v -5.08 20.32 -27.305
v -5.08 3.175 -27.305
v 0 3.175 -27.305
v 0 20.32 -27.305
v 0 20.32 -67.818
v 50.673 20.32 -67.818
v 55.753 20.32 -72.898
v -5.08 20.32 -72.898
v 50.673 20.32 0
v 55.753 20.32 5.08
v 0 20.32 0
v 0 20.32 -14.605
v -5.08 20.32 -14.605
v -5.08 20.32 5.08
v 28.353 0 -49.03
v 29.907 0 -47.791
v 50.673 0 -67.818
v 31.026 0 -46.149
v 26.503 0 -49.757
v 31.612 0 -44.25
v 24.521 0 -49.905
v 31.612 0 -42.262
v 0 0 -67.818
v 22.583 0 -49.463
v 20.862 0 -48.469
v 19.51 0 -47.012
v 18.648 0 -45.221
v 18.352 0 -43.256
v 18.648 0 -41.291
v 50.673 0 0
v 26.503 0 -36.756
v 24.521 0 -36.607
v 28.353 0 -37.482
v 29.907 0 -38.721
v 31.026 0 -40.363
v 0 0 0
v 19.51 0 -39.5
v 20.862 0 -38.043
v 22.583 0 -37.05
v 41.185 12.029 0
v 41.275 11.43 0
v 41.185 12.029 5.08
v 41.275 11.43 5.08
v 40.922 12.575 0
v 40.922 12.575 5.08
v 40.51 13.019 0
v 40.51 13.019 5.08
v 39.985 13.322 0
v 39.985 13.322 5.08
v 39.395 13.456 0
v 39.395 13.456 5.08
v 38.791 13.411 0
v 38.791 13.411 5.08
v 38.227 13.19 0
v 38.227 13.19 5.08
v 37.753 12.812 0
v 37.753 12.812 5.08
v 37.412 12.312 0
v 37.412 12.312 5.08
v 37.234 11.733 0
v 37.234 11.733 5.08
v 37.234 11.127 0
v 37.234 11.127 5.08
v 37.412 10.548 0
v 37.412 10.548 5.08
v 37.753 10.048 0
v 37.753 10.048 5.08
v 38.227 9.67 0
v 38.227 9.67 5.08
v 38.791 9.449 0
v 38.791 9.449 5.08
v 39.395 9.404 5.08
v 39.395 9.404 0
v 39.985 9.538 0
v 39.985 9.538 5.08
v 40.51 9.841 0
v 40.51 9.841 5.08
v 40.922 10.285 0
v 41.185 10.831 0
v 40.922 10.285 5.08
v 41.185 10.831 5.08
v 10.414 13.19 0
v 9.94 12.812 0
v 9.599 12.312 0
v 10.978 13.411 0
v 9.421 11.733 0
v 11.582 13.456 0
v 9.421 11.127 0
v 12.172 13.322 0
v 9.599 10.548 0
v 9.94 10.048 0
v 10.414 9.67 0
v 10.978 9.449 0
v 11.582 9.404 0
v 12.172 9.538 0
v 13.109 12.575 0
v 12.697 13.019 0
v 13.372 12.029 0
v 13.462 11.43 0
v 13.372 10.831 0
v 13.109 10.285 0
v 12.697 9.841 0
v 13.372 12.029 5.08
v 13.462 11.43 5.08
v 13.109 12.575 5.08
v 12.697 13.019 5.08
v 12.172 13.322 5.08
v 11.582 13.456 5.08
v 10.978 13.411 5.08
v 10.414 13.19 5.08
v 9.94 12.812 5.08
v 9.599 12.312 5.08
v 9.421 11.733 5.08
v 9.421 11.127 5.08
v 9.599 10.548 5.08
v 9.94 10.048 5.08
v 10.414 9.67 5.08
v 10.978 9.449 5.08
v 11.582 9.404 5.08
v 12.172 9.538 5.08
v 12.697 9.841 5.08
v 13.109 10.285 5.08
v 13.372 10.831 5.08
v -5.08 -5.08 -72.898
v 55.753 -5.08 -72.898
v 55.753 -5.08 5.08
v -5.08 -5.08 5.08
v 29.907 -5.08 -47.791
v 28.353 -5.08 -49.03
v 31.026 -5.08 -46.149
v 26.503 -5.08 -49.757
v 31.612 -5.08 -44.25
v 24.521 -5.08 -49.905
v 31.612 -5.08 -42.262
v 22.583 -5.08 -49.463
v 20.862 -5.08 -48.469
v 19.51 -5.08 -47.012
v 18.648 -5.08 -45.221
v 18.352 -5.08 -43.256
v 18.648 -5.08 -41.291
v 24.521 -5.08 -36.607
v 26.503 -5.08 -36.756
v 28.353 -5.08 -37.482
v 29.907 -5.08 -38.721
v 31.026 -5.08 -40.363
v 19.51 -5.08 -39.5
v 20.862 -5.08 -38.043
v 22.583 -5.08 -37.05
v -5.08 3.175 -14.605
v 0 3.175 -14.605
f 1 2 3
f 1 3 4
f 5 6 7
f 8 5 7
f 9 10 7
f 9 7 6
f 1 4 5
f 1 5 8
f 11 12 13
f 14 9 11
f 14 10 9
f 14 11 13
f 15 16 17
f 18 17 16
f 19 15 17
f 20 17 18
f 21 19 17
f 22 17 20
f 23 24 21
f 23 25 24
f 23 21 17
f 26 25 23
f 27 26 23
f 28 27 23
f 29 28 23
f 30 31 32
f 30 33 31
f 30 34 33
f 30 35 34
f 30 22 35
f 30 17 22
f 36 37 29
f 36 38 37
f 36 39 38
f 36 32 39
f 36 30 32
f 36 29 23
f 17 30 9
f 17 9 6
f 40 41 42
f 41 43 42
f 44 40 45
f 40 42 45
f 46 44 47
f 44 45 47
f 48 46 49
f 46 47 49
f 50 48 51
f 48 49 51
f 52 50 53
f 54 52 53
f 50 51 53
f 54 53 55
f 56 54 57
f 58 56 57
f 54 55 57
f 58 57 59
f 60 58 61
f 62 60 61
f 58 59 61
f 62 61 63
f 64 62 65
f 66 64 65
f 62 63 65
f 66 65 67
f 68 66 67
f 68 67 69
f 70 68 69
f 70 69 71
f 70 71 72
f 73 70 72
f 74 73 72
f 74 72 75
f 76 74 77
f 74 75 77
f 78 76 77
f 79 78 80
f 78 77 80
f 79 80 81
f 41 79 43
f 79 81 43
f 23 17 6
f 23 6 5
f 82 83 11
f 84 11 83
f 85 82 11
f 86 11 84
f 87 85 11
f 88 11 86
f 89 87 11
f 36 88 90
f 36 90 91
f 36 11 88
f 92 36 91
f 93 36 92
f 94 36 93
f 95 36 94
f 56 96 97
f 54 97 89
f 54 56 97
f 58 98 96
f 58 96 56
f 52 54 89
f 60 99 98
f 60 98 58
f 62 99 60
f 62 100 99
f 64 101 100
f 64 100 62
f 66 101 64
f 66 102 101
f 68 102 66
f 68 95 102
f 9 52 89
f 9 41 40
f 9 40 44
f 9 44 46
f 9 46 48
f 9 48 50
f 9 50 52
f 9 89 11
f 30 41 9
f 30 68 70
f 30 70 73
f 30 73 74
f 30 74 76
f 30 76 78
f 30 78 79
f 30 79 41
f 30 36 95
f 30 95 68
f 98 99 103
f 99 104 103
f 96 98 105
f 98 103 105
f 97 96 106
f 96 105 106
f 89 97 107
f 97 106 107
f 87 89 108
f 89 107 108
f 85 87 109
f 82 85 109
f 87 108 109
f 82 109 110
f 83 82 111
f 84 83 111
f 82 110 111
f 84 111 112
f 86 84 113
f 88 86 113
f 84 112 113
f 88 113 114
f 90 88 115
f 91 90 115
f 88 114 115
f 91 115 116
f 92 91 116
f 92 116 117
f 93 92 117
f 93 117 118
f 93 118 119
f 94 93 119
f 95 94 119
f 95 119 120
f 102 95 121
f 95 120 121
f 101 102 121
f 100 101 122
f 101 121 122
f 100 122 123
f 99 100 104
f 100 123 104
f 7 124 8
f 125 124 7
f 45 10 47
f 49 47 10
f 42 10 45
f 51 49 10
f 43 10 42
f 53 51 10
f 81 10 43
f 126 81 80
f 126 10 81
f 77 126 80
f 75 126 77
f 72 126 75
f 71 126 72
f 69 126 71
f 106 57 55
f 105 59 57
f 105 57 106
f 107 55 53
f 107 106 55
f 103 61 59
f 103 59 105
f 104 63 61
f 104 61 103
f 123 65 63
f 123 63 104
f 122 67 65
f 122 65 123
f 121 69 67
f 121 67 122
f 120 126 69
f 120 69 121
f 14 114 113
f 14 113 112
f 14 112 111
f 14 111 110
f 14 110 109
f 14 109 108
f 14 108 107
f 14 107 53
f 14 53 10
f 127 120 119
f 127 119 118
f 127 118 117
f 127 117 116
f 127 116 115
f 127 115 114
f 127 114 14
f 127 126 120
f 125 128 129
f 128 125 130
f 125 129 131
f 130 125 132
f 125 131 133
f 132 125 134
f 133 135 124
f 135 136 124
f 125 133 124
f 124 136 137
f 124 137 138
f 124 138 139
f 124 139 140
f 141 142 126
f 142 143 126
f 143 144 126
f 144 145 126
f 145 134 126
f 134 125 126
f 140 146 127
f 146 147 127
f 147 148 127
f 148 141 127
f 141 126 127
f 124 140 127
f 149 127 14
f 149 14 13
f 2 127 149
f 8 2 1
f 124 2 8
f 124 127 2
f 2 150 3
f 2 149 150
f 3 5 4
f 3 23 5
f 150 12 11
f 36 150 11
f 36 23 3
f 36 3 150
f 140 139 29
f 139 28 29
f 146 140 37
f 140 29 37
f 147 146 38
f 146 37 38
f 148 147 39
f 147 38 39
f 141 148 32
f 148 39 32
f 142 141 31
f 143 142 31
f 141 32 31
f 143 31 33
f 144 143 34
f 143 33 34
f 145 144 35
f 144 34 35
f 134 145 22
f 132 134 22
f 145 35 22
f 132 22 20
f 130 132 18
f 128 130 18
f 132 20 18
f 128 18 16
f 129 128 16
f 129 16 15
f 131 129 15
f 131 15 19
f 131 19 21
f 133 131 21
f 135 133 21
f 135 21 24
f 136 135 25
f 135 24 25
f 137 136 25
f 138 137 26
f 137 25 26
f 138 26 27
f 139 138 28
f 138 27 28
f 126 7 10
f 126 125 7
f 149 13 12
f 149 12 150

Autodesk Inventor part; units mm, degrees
ref_plane "YZ Plane" through (0, 0, 0) normal (1, 0, 0) x (0, 1, 0)
ref_plane "XZ Plane" through (0, 0, 0) normal (0, 1, 0) x (-1, 0, 0)
ref_plane "XY Plane" through (0, 0, 0) normal (0, 0, 1) x (1, 0, 0)
sketch "Sketch1" plane through (0, 0, 0) normal (0, 1, 0) x (-1, 0, 0)
  line L0 (0, 0) -> (-50.673, 0)
  line L1 (-50.673, 0) -> (-50.673, -67.818)
  line L2 (-50.673, -67.818) -> (0, -67.818)
  line L3 (0, -67.818) -> (0, 0)
  line L4 (5.08, -72.898) -> (-55.753, -72.898)
  line L5 (-55.753, -72.898) -> (-55.753, 5.08)
  line L6 (-55.753, 5.08) -> (5.08, 5.08)
  line L7 (5.08, 5.08) -> (5.08, -72.898)
  circle A0 centre (-25.019, -43.2562) radius 6.6675
  circle A1 centre (34.7838, -26.9997) radius 2.286
  dimension "d0" = 50.673
  dimension "d1" = 67.818
  dimension "d2" = 5.08
  dimension "d11" = 13.335
  dimension "d14" = 4.572
extrude "Extrusion1" add sketch "Sketch1" along normal blind 20.32 and the other way blind 5.08 contours L4 L5 L6 L7
extrude "Extrusion2" add sketch "Sketch1" against normal blind 5.08 contours L3 L2 L1 L0 | A0
extrude "Extrusion3" cut sketch "Sketch1" against normal blind 127 contours A0
sketch "Sketch2" plane through (-5.08, -5.08, 5.08) normal (-1, 0, 0) x (0, 0, 1)
  line L0 (0, 25.4) -> (-19.685, 25.4)
  line L1 (-77.978, 25.4) -> (0, 25.4) projected
  line L2 (-19.685, 25.4) -> (-19.685, 8.255)
  line L3 (-5.08, 5.08) -> (-72.898, 5.08) projected
  line L4 (-19.685, 8.255) -> (-32.385, 8.255)
  line L5 (-32.385, 8.255) -> (-32.385, 25.4)
  line L6 (-19.685, 25.4) -> (-32.385, 25.4)
  dimension "d15" = 19.685
  dimension "d16" = 17.145
  dimension "d17" = 12.7
extrude "Extrusion4" cut sketch "Sketch2" against normal blind 25.4
sketch "Sketch5" plane through (-5.08, 20.32, 5.08) normal (0, 0, 1) x (1, 0, 0)
  line L0 (16.51, 0) -> (16.51, -8.89)
  line L1 (0, 0) -> (0, -25.4) projected
  line L2 (60.833, 0) -> (44.323, 0)
  line L3 (0, 0) -> (60.833, 0) projected
  line L4 (44.323, 0) -> (44.323, -8.89)
  circle A0 centre (44.323, -8.89) radius 2.032
  circle A1 centre (16.51, -8.89) radius 2.032
  point P0 (5.08, -20.32)
  point P1 (16.51, -0.0329)
  dimension "d21" = 8.89
  dimension "d22" = 16.51
  dimension "d23" = 16.51
  dimension "d24" = 8.89
  dimension "d25" = 4.064
  dimension "d26" = 4.064
extrude "Extrusion5" cut sketch "Sketch5" against normal blind 25.4
properties part number "BH_Engineering Club Autonomous Car_Encoder Holder"
